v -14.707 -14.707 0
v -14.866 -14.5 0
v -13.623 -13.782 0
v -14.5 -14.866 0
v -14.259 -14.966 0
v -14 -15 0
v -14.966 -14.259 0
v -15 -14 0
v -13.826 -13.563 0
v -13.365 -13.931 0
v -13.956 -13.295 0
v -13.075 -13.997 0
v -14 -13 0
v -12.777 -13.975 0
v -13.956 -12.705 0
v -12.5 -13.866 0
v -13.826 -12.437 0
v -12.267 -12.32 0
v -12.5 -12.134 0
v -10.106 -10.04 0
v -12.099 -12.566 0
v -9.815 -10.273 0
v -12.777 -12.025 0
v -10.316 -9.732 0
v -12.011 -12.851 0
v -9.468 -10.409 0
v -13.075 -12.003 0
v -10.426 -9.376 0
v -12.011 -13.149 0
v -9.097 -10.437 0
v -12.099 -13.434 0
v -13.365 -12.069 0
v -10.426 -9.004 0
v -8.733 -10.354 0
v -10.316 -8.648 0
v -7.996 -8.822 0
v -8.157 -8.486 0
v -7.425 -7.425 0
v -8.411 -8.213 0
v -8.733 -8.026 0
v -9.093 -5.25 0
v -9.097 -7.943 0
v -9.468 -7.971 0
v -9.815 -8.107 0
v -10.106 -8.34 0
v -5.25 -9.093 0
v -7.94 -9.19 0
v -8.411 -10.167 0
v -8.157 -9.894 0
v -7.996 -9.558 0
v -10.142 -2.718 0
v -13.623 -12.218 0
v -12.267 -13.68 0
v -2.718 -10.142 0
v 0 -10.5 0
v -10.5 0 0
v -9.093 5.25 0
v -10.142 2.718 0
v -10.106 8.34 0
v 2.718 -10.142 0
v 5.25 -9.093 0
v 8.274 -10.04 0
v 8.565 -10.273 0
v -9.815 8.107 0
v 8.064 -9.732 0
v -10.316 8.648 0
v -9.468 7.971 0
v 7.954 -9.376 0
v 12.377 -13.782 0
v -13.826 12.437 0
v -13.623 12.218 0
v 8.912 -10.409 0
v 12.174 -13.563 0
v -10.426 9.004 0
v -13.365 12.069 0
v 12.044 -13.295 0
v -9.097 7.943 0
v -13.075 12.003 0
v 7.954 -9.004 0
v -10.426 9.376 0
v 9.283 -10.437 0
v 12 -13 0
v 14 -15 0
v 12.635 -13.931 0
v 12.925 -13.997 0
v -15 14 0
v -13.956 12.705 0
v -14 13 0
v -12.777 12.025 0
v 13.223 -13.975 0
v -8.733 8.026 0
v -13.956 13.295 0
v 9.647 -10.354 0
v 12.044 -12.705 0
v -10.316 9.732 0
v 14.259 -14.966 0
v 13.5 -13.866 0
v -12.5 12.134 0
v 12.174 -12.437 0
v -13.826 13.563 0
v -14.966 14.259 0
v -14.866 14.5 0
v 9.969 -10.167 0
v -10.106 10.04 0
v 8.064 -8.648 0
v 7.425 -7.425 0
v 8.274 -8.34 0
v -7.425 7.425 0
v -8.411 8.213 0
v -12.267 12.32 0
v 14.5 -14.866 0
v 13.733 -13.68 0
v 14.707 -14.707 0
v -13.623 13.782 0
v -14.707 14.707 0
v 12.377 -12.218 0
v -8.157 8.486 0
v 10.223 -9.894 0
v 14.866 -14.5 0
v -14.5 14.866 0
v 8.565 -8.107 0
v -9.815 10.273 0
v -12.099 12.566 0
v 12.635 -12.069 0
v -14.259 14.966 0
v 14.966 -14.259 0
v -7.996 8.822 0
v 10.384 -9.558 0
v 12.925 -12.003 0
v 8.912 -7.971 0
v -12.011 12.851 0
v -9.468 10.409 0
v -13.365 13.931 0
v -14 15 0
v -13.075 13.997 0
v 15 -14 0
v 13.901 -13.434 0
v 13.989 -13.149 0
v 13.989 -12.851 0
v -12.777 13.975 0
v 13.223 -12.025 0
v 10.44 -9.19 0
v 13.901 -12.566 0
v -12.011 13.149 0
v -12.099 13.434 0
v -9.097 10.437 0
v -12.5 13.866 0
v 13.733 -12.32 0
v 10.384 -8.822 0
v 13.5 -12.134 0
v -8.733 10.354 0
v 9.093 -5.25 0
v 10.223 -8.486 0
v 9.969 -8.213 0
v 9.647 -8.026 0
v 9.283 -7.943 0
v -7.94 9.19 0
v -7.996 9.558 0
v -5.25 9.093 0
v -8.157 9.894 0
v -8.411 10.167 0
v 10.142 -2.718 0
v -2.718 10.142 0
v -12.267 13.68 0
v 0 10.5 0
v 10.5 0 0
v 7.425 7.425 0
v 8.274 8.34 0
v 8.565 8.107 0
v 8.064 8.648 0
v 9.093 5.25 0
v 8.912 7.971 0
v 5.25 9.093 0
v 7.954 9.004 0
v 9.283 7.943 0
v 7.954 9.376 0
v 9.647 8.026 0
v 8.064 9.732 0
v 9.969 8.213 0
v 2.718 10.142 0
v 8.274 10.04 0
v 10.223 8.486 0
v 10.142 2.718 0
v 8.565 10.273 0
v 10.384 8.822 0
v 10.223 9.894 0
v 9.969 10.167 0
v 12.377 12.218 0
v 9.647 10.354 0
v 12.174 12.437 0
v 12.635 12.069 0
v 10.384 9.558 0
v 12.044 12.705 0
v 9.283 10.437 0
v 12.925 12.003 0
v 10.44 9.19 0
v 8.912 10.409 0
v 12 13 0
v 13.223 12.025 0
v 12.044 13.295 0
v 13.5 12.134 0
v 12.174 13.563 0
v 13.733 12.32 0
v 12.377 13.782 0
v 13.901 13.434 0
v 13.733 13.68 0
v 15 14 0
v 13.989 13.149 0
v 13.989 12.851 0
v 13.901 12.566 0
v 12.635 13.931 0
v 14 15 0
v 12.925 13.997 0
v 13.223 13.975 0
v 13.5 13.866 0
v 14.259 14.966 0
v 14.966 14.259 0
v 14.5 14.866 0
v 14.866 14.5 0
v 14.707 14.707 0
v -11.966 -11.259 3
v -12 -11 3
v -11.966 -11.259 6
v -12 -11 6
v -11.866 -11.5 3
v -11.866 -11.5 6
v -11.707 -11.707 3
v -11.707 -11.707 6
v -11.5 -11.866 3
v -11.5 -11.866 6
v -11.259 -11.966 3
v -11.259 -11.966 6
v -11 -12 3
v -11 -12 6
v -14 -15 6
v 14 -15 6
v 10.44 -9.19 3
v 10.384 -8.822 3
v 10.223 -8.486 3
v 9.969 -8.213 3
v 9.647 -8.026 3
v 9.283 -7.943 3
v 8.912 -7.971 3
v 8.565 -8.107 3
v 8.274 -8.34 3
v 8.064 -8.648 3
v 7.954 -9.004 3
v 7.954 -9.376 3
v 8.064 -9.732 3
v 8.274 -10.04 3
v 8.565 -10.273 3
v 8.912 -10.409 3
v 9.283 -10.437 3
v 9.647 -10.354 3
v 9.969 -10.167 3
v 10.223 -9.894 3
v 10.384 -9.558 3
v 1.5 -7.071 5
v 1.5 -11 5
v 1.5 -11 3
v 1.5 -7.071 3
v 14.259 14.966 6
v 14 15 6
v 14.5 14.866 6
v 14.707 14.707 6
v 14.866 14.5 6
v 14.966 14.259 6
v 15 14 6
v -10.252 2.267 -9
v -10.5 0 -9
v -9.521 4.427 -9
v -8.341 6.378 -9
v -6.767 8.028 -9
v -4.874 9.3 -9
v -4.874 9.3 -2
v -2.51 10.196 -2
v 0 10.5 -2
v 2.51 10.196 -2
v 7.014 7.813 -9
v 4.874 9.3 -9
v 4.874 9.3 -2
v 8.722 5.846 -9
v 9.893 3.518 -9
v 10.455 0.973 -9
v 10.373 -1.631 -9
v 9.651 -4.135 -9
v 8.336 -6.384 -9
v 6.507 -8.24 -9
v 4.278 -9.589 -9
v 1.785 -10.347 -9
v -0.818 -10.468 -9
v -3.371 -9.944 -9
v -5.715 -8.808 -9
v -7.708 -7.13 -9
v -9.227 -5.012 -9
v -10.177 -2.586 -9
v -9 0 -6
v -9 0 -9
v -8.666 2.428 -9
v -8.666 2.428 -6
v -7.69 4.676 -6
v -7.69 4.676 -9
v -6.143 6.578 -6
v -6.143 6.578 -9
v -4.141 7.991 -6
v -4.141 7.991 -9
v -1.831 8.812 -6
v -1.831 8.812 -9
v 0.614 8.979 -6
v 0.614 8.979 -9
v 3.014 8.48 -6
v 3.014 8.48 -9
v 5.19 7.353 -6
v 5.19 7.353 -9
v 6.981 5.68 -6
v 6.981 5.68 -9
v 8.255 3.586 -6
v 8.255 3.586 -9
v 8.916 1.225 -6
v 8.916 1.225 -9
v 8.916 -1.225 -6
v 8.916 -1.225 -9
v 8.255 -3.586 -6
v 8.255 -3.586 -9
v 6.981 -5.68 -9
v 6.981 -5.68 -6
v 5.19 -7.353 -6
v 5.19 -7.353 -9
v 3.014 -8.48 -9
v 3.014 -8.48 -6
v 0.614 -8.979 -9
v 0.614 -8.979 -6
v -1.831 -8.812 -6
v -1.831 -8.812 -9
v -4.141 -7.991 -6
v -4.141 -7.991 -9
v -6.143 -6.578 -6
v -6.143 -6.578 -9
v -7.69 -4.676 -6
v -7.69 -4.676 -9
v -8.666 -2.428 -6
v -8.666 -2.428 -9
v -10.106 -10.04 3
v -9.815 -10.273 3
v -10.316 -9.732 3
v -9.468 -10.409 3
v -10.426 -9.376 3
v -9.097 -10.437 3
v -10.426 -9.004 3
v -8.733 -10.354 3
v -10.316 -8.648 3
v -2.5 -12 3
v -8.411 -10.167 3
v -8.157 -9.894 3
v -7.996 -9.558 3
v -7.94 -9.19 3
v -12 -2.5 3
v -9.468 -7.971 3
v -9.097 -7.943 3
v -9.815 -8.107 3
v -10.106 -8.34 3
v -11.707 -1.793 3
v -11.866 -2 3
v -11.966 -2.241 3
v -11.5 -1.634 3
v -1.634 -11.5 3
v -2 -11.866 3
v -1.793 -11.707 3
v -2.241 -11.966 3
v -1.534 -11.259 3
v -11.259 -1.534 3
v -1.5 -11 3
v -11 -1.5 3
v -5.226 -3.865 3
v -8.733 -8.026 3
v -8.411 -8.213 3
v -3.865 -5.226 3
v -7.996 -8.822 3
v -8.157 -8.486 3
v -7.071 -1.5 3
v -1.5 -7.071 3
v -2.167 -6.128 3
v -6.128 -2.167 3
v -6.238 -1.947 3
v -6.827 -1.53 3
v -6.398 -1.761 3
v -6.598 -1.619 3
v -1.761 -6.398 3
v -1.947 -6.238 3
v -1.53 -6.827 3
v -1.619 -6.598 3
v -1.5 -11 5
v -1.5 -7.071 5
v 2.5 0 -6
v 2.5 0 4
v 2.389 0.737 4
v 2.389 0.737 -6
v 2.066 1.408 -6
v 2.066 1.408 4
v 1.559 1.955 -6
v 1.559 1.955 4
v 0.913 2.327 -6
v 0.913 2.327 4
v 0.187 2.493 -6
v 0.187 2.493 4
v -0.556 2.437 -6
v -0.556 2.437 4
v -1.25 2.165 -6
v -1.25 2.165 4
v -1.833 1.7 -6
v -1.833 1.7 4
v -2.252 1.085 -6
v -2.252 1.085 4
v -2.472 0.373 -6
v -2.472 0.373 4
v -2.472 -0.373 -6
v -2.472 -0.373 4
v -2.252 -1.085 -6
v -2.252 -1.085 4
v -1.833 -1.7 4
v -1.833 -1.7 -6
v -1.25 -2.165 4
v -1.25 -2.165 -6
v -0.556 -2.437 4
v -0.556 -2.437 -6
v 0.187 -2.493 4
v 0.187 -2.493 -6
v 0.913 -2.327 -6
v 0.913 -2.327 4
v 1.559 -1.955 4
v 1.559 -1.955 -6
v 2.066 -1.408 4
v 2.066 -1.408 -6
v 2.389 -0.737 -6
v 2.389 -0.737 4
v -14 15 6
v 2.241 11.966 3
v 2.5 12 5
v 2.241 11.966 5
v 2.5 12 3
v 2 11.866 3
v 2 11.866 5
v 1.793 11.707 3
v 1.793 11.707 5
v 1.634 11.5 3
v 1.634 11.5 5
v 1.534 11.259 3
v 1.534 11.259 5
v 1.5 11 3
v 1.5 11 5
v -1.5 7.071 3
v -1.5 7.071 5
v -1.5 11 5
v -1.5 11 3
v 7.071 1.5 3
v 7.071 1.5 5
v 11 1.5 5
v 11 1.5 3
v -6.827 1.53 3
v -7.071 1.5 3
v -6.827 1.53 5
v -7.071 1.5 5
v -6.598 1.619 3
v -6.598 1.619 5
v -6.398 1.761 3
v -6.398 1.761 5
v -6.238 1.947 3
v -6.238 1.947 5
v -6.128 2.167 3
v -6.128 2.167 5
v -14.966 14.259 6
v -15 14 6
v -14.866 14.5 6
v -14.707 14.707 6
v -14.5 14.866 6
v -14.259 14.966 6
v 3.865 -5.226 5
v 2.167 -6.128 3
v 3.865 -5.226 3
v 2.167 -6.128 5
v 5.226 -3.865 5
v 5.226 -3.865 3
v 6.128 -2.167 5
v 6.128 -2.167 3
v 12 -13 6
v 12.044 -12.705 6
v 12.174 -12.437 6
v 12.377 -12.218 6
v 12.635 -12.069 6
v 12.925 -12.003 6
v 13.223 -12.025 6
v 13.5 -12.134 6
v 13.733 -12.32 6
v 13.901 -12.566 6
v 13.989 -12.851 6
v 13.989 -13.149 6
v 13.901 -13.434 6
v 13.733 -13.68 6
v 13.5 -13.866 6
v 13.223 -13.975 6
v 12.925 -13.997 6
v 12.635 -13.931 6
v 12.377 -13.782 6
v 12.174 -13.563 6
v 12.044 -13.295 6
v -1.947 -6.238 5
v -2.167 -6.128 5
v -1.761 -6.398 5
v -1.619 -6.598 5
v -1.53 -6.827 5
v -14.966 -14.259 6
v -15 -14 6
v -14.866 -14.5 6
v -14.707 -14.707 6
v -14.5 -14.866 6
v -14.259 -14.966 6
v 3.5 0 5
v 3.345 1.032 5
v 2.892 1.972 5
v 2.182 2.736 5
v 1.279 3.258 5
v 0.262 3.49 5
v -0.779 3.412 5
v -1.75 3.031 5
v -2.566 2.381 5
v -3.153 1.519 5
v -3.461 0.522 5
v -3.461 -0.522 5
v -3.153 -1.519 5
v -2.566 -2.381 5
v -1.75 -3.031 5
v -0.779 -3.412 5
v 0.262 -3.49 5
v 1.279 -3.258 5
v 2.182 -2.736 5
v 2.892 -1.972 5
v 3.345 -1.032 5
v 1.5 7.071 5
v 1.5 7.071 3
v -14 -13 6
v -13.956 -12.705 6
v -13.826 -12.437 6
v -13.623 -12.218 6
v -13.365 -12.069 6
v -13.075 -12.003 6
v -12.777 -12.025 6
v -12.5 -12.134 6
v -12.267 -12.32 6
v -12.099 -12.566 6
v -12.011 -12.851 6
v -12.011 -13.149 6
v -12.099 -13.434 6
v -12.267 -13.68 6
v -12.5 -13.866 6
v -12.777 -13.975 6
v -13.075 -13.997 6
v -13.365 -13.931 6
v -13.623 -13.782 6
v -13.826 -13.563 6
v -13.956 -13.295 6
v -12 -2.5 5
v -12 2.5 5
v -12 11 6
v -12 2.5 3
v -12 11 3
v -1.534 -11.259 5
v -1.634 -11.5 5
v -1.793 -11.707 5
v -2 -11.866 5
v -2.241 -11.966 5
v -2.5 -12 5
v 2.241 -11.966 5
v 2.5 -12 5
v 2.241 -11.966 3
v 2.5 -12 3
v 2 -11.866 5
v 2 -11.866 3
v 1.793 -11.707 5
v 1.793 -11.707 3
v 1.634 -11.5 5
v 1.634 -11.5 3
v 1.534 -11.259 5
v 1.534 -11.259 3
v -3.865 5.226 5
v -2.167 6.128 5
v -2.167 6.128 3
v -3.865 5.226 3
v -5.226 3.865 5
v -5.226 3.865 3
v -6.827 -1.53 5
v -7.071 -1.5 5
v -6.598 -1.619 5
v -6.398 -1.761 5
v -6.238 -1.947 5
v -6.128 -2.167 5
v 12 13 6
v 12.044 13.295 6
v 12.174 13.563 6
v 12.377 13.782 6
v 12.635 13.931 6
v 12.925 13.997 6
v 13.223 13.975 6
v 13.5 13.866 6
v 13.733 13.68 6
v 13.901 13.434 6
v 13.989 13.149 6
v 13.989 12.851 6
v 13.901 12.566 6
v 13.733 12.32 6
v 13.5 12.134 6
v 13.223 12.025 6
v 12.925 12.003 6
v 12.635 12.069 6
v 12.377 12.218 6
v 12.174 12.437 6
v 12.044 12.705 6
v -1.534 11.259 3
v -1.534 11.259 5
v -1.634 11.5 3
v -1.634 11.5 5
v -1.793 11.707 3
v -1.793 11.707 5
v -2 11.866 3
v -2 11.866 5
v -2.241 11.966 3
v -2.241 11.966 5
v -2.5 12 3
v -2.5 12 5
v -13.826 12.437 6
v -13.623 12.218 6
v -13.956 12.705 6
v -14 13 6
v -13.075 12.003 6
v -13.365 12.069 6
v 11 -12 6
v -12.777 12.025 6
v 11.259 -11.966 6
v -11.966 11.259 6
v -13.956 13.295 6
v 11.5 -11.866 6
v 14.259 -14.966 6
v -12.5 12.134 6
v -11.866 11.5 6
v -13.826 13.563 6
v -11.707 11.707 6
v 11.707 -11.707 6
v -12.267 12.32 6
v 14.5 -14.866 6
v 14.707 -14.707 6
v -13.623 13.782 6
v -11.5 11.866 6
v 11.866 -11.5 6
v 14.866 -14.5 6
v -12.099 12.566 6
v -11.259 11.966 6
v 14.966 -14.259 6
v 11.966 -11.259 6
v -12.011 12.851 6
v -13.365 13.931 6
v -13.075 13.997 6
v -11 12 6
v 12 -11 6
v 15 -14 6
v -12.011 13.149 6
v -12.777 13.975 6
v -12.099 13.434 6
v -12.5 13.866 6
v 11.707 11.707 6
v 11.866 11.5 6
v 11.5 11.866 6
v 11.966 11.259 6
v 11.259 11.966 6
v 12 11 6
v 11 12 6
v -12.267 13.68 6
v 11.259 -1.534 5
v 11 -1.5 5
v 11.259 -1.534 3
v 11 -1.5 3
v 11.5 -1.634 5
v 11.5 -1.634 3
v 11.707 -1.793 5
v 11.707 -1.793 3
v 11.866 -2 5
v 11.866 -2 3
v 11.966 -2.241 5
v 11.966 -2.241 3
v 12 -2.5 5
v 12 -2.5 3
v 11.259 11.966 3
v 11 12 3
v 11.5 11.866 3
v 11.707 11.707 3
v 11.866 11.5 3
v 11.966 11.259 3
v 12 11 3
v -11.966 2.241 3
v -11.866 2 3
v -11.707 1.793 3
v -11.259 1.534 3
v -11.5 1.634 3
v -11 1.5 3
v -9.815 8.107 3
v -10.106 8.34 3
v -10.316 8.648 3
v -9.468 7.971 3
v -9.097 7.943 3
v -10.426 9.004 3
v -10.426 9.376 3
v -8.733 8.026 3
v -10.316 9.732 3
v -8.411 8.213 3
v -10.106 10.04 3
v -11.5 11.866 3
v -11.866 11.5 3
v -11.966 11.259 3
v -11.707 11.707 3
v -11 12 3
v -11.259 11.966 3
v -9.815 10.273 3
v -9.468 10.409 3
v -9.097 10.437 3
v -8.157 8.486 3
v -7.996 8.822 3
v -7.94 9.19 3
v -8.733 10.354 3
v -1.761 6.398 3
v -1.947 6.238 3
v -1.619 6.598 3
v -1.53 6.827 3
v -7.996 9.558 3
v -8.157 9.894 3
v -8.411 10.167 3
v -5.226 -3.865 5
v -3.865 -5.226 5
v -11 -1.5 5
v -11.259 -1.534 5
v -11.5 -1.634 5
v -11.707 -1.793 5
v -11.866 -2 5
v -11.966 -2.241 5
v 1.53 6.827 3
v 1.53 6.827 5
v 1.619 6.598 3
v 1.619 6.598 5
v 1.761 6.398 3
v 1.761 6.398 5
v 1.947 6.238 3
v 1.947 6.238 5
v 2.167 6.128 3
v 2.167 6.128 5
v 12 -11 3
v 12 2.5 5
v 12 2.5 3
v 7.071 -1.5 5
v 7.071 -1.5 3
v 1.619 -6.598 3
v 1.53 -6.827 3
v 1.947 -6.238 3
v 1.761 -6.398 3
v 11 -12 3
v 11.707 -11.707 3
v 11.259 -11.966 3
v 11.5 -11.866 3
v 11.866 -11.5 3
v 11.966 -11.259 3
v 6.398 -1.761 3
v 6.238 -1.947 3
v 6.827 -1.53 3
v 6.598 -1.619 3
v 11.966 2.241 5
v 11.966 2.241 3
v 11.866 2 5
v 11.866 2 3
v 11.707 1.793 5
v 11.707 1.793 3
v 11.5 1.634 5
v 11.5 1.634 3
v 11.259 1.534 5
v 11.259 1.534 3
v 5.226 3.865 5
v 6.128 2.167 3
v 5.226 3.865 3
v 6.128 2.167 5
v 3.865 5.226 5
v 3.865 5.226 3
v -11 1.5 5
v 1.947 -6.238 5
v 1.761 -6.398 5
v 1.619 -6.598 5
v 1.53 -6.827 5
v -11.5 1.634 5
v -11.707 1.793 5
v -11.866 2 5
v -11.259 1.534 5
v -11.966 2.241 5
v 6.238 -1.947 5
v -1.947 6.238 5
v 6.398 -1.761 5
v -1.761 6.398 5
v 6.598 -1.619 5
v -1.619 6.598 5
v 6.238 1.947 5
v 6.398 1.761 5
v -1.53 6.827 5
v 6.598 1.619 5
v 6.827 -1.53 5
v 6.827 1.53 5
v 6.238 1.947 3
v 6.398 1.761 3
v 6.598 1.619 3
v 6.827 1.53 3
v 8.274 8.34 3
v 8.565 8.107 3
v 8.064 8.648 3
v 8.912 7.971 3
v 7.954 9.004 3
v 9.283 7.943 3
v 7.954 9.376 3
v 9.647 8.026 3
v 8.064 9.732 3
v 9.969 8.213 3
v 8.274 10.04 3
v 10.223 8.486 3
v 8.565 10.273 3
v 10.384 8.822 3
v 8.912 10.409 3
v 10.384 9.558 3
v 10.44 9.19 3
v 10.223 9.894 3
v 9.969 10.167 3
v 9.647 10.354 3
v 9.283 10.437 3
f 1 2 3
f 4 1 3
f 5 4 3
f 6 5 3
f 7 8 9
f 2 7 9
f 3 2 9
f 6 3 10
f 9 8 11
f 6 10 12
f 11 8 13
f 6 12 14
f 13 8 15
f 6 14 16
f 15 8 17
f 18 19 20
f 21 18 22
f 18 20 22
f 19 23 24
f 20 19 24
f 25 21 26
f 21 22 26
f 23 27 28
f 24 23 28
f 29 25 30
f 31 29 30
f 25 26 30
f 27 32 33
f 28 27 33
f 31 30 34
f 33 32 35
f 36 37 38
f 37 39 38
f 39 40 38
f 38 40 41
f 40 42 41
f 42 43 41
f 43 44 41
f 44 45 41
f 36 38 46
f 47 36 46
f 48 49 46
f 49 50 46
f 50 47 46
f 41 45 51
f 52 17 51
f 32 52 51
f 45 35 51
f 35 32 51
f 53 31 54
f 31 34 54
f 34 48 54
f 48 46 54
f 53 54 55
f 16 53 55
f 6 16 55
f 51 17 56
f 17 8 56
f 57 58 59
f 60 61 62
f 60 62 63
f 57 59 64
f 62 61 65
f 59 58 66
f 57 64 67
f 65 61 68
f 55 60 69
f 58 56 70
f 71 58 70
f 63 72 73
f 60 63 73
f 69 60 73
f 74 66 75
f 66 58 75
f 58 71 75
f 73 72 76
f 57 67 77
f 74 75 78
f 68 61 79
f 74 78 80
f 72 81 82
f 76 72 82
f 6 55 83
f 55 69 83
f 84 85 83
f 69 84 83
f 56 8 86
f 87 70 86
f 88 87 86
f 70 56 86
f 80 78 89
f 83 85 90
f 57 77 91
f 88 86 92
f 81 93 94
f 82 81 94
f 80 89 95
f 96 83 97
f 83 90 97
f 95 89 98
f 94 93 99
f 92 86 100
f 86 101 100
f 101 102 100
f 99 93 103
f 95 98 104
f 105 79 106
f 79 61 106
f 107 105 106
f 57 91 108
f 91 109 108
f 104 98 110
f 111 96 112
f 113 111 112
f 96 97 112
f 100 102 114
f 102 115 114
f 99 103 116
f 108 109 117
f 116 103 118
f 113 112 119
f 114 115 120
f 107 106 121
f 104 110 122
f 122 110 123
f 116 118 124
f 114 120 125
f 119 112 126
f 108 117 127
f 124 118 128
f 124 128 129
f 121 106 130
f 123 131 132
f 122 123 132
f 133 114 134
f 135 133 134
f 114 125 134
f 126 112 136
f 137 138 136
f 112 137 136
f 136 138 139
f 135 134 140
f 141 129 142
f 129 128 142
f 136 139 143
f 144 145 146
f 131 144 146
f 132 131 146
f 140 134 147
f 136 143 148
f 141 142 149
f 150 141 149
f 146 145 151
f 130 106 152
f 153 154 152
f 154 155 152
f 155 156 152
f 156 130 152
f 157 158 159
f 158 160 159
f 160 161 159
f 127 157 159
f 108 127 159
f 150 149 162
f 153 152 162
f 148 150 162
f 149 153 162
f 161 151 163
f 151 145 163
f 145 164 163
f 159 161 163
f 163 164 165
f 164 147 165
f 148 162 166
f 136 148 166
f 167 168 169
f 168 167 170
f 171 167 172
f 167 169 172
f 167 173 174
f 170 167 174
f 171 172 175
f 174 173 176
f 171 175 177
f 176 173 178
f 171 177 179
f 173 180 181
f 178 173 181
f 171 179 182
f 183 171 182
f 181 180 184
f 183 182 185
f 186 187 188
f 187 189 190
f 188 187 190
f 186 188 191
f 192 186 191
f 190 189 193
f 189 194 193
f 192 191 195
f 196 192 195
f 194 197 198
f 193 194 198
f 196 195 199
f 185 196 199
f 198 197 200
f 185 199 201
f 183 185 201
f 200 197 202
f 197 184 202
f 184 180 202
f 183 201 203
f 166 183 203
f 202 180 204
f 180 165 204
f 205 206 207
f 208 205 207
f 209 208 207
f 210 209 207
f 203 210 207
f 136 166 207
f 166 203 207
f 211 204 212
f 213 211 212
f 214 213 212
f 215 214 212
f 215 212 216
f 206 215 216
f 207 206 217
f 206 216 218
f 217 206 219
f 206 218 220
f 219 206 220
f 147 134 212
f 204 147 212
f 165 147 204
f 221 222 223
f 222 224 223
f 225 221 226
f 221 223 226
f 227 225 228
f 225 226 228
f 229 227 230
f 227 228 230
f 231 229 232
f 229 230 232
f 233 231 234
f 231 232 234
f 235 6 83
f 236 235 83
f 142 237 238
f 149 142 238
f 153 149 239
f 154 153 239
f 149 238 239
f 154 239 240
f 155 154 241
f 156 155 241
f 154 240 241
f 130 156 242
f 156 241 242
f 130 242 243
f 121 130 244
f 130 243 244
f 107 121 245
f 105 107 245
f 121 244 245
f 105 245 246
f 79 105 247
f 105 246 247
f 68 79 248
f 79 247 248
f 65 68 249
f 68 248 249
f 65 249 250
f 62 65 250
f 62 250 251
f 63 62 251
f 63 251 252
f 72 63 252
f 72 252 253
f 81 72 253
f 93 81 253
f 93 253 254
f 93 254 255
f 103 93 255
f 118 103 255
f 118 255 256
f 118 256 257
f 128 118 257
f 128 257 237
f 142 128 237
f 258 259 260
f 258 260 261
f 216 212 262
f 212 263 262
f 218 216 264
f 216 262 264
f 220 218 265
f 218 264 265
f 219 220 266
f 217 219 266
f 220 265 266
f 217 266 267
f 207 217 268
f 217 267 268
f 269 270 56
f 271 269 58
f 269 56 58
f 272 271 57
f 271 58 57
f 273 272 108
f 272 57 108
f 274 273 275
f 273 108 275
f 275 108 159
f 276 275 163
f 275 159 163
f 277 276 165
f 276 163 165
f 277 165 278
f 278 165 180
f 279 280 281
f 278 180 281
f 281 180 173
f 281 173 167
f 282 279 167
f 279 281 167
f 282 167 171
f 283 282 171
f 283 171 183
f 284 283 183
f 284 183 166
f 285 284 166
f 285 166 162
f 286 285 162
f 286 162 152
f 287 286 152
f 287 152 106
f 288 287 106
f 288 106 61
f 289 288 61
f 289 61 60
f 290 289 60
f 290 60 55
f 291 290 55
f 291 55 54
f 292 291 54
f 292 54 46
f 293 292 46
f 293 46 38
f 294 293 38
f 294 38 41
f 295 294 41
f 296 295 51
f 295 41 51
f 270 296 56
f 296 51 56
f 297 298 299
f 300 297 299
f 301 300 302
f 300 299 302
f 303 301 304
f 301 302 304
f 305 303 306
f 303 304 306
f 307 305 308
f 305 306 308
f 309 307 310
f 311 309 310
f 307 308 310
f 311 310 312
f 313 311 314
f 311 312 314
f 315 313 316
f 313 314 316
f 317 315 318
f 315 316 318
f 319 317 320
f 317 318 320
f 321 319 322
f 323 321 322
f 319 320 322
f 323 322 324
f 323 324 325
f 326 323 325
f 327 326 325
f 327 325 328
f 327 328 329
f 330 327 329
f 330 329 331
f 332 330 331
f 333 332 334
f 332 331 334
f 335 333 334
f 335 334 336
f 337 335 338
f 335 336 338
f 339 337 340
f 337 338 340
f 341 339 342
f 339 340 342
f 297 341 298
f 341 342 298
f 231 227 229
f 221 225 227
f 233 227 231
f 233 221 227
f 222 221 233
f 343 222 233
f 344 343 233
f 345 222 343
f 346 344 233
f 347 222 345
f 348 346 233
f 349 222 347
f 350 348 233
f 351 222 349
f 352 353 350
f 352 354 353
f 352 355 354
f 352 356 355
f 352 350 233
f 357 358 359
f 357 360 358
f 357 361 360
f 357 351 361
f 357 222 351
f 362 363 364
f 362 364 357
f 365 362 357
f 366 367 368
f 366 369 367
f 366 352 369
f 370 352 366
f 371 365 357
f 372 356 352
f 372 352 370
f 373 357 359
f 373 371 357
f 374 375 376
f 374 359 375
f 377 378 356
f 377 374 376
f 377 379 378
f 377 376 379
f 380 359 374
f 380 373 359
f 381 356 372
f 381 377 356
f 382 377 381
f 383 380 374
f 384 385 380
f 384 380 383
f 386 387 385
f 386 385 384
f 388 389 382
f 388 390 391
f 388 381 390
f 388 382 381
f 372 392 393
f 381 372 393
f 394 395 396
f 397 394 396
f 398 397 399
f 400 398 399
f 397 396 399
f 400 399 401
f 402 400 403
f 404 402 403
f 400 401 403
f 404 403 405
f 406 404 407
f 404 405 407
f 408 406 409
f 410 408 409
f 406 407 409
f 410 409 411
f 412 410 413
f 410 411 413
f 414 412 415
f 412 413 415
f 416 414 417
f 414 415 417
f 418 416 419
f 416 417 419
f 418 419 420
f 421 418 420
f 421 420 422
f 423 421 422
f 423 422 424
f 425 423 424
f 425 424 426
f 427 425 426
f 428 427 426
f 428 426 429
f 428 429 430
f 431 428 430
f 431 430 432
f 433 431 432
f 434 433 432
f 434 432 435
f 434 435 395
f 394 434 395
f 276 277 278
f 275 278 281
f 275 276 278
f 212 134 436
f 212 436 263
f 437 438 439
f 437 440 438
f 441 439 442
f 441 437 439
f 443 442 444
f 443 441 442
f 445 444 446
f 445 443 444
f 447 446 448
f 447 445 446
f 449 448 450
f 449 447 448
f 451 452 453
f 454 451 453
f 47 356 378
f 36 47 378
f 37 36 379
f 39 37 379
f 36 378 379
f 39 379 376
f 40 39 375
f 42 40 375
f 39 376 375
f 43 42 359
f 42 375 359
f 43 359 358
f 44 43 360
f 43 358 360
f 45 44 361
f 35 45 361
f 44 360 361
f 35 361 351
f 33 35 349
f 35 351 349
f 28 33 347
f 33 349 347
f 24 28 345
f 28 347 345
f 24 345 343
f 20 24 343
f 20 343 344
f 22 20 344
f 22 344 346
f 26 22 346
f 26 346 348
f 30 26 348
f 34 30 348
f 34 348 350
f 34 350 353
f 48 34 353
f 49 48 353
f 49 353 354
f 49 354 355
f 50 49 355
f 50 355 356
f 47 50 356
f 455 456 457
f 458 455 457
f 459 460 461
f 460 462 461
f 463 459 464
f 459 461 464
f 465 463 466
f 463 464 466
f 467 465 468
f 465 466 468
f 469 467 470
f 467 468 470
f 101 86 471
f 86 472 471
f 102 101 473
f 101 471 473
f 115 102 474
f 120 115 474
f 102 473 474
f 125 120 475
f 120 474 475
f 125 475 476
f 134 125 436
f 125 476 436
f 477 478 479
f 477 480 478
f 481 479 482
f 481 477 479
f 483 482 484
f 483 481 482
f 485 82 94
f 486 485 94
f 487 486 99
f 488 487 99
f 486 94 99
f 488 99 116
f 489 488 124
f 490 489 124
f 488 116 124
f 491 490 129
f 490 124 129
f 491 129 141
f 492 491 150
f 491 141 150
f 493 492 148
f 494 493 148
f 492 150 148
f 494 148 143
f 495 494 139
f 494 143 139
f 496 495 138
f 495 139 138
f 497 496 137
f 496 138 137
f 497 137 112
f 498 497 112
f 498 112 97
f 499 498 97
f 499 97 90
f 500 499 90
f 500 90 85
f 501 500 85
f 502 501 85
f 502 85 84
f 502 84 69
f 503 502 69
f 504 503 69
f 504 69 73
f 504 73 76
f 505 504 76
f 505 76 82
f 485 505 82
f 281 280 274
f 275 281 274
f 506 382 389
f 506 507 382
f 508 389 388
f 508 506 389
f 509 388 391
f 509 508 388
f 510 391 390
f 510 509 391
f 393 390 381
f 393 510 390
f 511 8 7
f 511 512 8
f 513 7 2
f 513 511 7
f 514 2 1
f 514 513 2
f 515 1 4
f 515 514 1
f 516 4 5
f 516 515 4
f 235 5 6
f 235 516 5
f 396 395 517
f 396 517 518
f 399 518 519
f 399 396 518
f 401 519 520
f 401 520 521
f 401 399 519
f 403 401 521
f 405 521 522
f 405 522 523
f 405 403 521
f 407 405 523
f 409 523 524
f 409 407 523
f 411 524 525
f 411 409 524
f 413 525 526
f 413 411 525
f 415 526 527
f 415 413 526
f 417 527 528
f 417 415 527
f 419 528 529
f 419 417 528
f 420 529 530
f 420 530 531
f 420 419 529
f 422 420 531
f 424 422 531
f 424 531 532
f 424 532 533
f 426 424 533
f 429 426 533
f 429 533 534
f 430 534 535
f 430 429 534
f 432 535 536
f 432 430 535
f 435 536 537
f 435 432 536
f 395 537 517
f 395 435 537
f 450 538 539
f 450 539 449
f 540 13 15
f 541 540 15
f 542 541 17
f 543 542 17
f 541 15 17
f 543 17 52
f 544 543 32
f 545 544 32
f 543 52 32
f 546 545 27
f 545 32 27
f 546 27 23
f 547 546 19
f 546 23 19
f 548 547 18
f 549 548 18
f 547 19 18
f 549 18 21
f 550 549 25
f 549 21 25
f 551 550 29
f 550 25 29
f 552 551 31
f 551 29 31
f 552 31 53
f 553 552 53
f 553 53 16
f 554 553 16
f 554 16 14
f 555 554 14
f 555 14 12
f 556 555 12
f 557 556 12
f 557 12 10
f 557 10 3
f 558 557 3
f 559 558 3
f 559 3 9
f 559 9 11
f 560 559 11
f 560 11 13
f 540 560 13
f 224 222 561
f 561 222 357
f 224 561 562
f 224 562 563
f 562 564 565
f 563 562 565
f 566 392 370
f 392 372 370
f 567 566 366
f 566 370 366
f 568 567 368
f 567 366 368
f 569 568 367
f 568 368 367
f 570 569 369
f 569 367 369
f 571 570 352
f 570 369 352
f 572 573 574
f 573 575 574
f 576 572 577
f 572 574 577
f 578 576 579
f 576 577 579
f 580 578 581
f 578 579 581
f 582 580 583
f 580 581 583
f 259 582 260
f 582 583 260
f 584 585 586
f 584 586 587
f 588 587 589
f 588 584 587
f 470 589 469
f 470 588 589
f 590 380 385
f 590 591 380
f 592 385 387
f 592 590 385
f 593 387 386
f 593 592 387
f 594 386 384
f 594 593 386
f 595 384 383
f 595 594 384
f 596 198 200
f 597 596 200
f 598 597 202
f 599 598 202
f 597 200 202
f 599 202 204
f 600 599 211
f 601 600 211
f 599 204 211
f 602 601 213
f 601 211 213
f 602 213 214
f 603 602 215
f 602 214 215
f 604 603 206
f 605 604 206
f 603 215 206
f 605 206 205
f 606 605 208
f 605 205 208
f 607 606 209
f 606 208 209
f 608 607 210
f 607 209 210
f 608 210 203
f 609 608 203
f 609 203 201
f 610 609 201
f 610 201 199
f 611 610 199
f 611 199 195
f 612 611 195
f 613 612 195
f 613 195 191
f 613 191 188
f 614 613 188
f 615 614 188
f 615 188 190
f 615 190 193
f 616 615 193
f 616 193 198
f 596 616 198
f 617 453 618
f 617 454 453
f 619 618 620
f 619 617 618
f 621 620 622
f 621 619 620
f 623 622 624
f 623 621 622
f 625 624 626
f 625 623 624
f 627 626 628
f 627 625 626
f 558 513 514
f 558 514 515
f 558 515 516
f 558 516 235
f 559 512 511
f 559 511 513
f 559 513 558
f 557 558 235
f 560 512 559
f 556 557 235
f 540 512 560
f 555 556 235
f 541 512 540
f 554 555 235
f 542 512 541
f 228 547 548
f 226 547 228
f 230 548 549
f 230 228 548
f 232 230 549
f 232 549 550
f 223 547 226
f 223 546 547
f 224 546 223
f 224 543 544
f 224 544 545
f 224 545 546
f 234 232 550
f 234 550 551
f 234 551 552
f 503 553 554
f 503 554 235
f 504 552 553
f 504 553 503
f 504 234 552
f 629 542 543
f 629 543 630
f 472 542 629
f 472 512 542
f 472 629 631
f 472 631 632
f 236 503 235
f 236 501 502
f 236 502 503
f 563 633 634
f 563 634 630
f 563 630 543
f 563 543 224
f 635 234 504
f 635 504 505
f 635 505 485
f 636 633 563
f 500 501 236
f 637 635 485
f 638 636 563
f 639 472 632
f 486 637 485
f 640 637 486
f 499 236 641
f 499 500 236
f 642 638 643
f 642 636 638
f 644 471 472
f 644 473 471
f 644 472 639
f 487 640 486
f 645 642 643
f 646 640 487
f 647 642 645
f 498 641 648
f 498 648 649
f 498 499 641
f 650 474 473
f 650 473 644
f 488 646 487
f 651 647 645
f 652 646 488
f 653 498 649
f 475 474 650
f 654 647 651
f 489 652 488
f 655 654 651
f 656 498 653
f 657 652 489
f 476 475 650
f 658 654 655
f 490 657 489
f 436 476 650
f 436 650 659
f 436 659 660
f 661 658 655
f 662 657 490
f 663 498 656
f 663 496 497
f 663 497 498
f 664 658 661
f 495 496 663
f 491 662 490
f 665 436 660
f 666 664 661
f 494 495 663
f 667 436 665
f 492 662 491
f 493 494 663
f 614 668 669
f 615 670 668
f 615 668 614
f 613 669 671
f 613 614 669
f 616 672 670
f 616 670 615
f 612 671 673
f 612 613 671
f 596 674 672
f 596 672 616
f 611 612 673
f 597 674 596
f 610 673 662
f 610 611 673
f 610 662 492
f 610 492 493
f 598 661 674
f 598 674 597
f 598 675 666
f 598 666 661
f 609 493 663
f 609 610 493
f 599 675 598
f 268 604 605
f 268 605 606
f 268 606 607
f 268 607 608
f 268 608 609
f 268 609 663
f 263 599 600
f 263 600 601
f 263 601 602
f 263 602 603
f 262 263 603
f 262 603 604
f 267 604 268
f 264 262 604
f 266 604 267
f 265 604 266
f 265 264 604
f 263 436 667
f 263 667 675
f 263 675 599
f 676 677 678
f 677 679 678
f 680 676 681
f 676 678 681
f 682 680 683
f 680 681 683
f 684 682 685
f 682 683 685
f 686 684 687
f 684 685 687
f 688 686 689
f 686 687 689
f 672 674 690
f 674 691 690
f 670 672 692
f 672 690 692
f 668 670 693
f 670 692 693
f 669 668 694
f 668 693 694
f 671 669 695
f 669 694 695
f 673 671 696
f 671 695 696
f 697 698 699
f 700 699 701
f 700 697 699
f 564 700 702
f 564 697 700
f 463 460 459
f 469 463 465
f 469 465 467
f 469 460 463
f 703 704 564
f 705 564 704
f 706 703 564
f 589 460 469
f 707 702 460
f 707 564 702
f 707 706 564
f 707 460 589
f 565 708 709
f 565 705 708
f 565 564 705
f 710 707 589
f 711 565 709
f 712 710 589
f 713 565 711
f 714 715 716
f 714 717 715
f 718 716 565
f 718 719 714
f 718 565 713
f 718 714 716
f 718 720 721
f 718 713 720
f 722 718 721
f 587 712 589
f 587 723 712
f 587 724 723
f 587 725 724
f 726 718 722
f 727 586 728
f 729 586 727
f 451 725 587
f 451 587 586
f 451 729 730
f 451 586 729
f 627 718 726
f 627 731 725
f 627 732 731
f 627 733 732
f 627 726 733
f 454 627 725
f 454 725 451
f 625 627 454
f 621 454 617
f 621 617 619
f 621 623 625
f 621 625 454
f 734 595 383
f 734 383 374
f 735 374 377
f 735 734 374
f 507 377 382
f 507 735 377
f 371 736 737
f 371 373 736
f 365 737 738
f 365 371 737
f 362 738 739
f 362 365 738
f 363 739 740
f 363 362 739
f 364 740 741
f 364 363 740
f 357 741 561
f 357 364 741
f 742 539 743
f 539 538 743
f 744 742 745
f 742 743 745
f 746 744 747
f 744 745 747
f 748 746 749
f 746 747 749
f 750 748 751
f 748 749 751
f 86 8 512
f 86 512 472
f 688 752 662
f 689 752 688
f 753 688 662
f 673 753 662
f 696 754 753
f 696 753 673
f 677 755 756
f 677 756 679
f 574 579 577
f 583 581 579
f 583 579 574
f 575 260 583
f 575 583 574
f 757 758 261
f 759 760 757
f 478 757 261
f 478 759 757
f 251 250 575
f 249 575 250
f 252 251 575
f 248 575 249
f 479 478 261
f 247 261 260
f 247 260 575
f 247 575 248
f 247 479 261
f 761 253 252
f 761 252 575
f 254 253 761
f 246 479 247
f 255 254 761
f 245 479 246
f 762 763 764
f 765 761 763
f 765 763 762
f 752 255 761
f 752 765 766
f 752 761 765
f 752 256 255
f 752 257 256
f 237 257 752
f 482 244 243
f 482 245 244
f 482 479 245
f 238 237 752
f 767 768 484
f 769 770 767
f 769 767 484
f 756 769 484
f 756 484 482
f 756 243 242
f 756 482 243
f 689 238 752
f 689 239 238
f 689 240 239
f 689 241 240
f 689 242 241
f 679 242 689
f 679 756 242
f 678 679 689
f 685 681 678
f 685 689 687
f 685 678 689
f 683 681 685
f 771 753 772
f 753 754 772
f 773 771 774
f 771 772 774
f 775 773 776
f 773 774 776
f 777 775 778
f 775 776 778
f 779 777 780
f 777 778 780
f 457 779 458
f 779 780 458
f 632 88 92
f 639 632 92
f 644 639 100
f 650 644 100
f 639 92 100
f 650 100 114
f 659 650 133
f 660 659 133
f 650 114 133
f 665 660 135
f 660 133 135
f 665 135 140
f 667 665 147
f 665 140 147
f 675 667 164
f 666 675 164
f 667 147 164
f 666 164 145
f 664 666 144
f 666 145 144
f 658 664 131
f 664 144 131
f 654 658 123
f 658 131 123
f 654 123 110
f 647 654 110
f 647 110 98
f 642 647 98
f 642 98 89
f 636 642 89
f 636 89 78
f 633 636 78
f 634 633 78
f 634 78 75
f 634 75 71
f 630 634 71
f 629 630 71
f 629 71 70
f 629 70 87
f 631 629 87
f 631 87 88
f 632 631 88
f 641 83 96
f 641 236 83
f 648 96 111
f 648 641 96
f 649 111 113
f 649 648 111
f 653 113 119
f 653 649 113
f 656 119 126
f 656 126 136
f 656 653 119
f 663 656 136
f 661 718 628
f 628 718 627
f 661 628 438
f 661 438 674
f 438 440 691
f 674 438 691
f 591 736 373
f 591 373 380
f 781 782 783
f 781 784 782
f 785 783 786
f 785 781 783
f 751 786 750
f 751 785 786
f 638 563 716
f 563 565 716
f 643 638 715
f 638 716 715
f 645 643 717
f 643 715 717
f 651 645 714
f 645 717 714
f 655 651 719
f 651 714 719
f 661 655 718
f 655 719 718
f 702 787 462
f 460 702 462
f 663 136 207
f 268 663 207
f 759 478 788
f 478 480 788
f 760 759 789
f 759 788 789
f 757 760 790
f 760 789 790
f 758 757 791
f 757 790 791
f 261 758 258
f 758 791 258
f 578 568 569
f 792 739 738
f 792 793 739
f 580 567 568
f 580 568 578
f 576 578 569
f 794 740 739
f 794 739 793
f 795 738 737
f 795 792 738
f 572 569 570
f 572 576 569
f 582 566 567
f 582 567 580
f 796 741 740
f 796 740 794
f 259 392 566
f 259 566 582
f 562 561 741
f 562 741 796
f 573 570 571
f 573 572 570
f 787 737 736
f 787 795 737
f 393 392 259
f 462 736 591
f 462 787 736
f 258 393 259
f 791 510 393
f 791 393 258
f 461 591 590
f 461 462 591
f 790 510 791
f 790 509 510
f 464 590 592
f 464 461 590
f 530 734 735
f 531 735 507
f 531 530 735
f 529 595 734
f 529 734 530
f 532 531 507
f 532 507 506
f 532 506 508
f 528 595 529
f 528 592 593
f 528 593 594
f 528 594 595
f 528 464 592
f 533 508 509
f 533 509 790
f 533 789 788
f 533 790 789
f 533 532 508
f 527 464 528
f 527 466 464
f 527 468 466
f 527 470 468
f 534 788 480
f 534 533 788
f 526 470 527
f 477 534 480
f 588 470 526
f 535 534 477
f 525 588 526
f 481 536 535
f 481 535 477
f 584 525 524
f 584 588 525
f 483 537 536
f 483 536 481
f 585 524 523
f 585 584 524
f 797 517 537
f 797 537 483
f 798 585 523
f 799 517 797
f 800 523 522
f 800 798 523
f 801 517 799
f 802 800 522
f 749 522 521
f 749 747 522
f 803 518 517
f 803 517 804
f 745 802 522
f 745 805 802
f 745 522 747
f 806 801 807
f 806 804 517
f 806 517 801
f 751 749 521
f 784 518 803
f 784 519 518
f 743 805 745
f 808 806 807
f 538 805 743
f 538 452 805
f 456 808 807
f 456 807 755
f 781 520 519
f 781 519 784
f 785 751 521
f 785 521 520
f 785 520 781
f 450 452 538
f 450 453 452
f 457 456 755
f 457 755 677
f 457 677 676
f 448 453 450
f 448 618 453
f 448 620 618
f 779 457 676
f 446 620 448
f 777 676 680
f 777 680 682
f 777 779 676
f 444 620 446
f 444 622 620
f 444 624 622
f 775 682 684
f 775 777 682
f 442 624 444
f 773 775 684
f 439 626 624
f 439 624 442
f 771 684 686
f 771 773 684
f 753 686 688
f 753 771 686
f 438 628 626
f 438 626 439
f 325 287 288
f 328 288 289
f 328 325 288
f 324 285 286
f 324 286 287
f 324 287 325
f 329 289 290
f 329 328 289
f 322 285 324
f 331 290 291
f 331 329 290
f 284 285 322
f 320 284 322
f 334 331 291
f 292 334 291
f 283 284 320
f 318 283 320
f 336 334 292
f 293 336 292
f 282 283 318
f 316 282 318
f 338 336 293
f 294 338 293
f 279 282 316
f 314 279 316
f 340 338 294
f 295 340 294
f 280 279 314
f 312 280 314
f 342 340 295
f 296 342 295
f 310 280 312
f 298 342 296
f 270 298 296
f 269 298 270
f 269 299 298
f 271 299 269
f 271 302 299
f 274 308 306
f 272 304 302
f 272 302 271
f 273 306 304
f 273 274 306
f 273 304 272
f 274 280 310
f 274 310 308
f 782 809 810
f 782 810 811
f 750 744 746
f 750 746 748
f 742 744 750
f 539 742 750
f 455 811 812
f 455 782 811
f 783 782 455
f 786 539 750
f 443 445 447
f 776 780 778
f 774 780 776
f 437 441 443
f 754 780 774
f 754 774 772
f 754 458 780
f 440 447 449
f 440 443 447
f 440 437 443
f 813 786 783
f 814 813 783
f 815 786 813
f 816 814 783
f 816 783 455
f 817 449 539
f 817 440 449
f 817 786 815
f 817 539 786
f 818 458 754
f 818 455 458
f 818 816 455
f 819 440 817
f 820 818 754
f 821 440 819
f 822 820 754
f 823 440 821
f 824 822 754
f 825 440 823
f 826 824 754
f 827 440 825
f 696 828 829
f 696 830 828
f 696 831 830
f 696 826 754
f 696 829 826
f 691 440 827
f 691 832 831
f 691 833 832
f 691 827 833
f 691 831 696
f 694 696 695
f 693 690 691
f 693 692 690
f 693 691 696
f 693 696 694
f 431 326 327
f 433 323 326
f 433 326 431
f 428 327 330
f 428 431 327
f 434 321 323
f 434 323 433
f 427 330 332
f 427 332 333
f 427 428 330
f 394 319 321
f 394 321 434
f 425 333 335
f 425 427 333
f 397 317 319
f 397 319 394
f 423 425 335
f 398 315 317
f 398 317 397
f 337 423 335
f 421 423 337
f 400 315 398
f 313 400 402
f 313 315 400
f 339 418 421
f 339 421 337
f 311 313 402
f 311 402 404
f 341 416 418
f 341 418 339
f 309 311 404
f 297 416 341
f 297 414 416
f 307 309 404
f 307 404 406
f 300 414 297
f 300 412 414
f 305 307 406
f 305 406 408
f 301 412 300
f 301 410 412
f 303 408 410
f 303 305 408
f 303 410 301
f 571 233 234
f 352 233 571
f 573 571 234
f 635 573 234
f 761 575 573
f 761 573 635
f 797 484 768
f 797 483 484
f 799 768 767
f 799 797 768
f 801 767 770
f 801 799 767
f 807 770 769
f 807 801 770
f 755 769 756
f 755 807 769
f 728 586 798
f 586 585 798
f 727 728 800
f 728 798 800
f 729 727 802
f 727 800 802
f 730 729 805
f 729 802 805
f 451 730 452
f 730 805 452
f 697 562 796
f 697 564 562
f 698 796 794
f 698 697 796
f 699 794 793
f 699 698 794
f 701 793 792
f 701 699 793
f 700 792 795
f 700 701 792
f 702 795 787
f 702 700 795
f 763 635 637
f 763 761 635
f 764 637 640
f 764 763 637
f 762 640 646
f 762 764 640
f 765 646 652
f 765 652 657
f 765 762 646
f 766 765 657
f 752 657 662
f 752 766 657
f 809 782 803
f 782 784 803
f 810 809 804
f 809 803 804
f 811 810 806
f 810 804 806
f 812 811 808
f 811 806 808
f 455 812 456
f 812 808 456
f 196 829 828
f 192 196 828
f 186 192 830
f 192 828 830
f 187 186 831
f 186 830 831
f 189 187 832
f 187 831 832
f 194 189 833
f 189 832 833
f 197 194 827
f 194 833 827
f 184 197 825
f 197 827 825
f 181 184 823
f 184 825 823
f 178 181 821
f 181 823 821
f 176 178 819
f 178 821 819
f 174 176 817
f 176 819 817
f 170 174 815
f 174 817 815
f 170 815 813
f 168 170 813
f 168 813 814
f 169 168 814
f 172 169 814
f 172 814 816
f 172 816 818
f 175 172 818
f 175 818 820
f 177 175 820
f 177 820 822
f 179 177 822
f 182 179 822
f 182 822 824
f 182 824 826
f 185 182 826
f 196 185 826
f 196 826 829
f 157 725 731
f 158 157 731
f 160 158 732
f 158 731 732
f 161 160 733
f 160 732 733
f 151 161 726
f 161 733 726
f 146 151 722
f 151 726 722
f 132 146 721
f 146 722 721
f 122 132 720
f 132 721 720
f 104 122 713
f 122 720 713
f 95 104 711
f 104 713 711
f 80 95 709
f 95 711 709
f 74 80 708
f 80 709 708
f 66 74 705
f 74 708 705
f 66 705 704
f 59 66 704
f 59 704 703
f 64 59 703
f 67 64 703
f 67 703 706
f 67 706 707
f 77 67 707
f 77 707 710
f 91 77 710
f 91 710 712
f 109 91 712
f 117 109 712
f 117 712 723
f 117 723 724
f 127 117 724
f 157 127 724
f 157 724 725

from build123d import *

# Parameters (mm, degrees)
SKETCH2_W              = 30
SKETCH2_H              = 30
BOSS_EXTRUDE1_DEPTH    = 6
CUT_EXTRUDE1_START     = -1
CUT_EXTRUDE1_OUTLINE_W = 24
CUT_EXTRUDE1_OUTLINE_H = 24
CUT_EXTRUDE1_DEPTH     = 1
SKETCH4_W              = 24
SKETCH4_H              = 24
SKETCH4_R              = 6.5
CUT_EXTRUDE2_DEPTH     = 2
SKETCH5_W              = 3
SKETCH5_H              = 24
BOSS_EXTRUDE2_DEPTH    = 2
SKETCH6_W              = 24
SKETCH6_H              = 3
BOSS_EXTRUDE3_DEPTH    = 2
FILLET1_R              = 1
FILLET2_R              = 1
SKETCH8_R              = 1.25
CUT_EXTRUDE3_DEPTH     = 10
SKETCH7_R              = 1.25
CUT_EXTRUDE4_DEPTH     = 6
FILLET3_R              = 1
SKETCH10_R             = 10.5
BOSS_EXTRUDE4_DEPTH    = 9
SKETCH11_R             = 9
CUT_EXTRUDE5_DEPTH     = 3
SKETCH9_R              = 2.5
CUT_EXTRUDE6_DEPTH     = 26.416530054
SKETCH12_R             = 1
CUT_EXTRUDE7_DEPTH     = 13
SKETCH13_W             = 15.514513233
SKETCH13_H             = 2.095553254
CUT_EXTRUDE9_DEPTH     = 7
CHAMFER1_SIZE          = 1


# Read off the part's stored shape, not the designer's step: Cut-Extrude1
with BuildPart() as part:
    # Sketch2 → Boss-Extrude1 (new body)
    with BuildSketch(Plane.XY):
        Rectangle(SKETCH2_W, SKETCH2_H)
    extrude(amount=BOSS_EXTRUDE1_DEPTH)

    # Cut-Extrude1 outline → Cut-Extrude1 (cut)
    with BuildSketch(Plane.XY.offset(6).offset(CUT_EXTRUDE1_START)):
        Rectangle(CUT_EXTRUDE1_OUTLINE_W, CUT_EXTRUDE1_OUTLINE_H)
    extrude(amount=CUT_EXTRUDE1_DEPTH, mode=Mode.SUBTRACT)

    # Sketch4 → Cut-Extrude2 (cut)
    with BuildSketch(Plane.XY.offset(5)):
        Rectangle(SKETCH4_W, SKETCH4_H)
        Circle(SKETCH4_R, mode=Mode.SUBTRACT)
    extrude(amount=-CUT_EXTRUDE2_DEPTH, mode=Mode.SUBTRACT)

    # Sketch5 → Boss-Extrude2 (add)
    with BuildSketch(Plane.XY.offset(5)):
        Rectangle(SKETCH5_W, SKETCH5_H)
    extrude(amount=-BOSS_EXTRUDE2_DEPTH)

    # Sketch6 → Boss-Extrude3 (add)
    with BuildSketch(Plane.XY.offset(5)):
        Rectangle(SKETCH6_W, SKETCH6_H)
    extrude(amount=-BOSS_EXTRUDE3_DEPTH)

    # Fillet1
    fillet1_edges = [part.edges().sort_by_distance(p)[0] for p in [
        (1.5, 6.32455532, 4),
        (-1.5, -6.32455532, 4),
        (1.5, -6.32455532, 4),
        (-1.5, 6.32455532, 4),
        (6.32455532, -1.5, 4),
        (6.32455532, 1.5, 4),
        (-6.32455532, -1.5, 4),
        (-6.32455532, 1.5, 4),
    ]]
    fillet(fillet1_edges, radius=FILLET1_R)

    # Fillet2
    fillet2_edges = [part.edges().sort_by_distance(p)[0] for p in [
        (12, 12, 4.5),
        (12, -12, 4.5),
        (-12, -12, 4.5),
        (-12, 12, 4.5),
        (1.5, 12, 4),
        (-1.5, -12, 4),
        (1.5, -12, 4),
        (-1.5, 12, 4),
        (12, -1.5, 4),
        (12, 1.5, 4),
        (-12, -1.5, 4),
        (-12, 1.5, 4),
    ]]
    fillet(fillet2_edges, radius=FILLET2_R)

    # Sketch8 → Cut-Extrude3 (cut)
    with BuildSketch(Plane.XY.offset(3)):
        with Locations((-9.19, -9.19)):
            Circle(SKETCH8_R)
        with Locations((9.19, -9.19)):
            Circle(SKETCH8_R)
    extrude(amount=-CUT_EXTRUDE3_DEPTH, mode=Mode.SUBTRACT)

    # Sketch7 → Cut-Extrude4 (cut)
    with BuildSketch(Plane.XY.offset(6)):
        with Locations((-9.19, 9.19)):
            Circle(SKETCH7_R)
        with Locations((9.19, 9.19)):
            Circle(SKETCH7_R)
    extrude(amount=-CUT_EXTRUDE4_DEPTH, mode=Mode.SUBTRACT)

    # Fillet3
    fillet3_edges = [part.edges().sort_by_distance(p)[0] for p in [
        (15, -15, 3),
        (-15, -15, 3),
        (-15, 15, 3),
        (15, 15, 3),
    ]]
    fillet(fillet3_edges, radius=FILLET3_R)

    # Sketch10 → Boss-Extrude4 (add)
    with BuildSketch(Plane(origin=(0, 0, 0), x_dir=(-1, 0, 0), z_dir=(0, 0, -1))):
        Circle(SKETCH10_R)
    extrude(amount=BOSS_EXTRUDE4_DEPTH)

    # Sketch11 → Cut-Extrude5 (cut)
    with BuildSketch(Plane(origin=(0, 0, -9), x_dir=(-1, 0, 0), z_dir=(0, 0, -1))):
        Circle(SKETCH11_R)
    extrude(amount=-CUT_EXTRUDE5_DEPTH, mode=Mode.SUBTRACT)

    # Sketch9 → Cut-Extrude6 (cut, through all)
    with BuildSketch(Plane.XY.offset(5)):
        Circle(SKETCH9_R)
    extrude(amount=-CUT_EXTRUDE6_DEPTH, mode=Mode.SUBTRACT)

    # Sketch12 → Cut-Extrude7 (cut)
    with BuildSketch(Plane(origin=(0, 0, 0), x_dir=(-1, 0, 0), z_dir=(0, 0, -1))):
        with Locations((13, 13)):
            Circle(SKETCH12_R)
        with Locations((-13, 13)):
            Circle(SKETCH12_R)
        with Locations((-13, -13)):
            Circle(SKETCH12_R)
        with Locations((13, -13)):
            Circle(SKETCH12_R)
    extrude(amount=-CUT_EXTRUDE7_DEPTH, mode=Mode.SUBTRACT)

    # Sketch13 → Cut-Extrude9 (cut)
    with BuildSketch(Plane(origin=(0, 0, -9), x_dir=(-1, 0, 0), z_dir=(0, 0, -1))):
        with Locations((1.781437306, 10.347776627)):
            Rectangle(SKETCH13_W, SKETCH13_H)
    extrude(amount=-CUT_EXTRUDE9_DEPTH, mode=Mode.SUBTRACT)

    # Chamfer1
    chamfer1_edges = [part.edges().sort_by_distance(p)[0] for p in [
        (-2.5, 0, 5),
    ]]
    chamfer(chamfer1_edges, length=CHAMFER1_SIZE)


solid = part.part
